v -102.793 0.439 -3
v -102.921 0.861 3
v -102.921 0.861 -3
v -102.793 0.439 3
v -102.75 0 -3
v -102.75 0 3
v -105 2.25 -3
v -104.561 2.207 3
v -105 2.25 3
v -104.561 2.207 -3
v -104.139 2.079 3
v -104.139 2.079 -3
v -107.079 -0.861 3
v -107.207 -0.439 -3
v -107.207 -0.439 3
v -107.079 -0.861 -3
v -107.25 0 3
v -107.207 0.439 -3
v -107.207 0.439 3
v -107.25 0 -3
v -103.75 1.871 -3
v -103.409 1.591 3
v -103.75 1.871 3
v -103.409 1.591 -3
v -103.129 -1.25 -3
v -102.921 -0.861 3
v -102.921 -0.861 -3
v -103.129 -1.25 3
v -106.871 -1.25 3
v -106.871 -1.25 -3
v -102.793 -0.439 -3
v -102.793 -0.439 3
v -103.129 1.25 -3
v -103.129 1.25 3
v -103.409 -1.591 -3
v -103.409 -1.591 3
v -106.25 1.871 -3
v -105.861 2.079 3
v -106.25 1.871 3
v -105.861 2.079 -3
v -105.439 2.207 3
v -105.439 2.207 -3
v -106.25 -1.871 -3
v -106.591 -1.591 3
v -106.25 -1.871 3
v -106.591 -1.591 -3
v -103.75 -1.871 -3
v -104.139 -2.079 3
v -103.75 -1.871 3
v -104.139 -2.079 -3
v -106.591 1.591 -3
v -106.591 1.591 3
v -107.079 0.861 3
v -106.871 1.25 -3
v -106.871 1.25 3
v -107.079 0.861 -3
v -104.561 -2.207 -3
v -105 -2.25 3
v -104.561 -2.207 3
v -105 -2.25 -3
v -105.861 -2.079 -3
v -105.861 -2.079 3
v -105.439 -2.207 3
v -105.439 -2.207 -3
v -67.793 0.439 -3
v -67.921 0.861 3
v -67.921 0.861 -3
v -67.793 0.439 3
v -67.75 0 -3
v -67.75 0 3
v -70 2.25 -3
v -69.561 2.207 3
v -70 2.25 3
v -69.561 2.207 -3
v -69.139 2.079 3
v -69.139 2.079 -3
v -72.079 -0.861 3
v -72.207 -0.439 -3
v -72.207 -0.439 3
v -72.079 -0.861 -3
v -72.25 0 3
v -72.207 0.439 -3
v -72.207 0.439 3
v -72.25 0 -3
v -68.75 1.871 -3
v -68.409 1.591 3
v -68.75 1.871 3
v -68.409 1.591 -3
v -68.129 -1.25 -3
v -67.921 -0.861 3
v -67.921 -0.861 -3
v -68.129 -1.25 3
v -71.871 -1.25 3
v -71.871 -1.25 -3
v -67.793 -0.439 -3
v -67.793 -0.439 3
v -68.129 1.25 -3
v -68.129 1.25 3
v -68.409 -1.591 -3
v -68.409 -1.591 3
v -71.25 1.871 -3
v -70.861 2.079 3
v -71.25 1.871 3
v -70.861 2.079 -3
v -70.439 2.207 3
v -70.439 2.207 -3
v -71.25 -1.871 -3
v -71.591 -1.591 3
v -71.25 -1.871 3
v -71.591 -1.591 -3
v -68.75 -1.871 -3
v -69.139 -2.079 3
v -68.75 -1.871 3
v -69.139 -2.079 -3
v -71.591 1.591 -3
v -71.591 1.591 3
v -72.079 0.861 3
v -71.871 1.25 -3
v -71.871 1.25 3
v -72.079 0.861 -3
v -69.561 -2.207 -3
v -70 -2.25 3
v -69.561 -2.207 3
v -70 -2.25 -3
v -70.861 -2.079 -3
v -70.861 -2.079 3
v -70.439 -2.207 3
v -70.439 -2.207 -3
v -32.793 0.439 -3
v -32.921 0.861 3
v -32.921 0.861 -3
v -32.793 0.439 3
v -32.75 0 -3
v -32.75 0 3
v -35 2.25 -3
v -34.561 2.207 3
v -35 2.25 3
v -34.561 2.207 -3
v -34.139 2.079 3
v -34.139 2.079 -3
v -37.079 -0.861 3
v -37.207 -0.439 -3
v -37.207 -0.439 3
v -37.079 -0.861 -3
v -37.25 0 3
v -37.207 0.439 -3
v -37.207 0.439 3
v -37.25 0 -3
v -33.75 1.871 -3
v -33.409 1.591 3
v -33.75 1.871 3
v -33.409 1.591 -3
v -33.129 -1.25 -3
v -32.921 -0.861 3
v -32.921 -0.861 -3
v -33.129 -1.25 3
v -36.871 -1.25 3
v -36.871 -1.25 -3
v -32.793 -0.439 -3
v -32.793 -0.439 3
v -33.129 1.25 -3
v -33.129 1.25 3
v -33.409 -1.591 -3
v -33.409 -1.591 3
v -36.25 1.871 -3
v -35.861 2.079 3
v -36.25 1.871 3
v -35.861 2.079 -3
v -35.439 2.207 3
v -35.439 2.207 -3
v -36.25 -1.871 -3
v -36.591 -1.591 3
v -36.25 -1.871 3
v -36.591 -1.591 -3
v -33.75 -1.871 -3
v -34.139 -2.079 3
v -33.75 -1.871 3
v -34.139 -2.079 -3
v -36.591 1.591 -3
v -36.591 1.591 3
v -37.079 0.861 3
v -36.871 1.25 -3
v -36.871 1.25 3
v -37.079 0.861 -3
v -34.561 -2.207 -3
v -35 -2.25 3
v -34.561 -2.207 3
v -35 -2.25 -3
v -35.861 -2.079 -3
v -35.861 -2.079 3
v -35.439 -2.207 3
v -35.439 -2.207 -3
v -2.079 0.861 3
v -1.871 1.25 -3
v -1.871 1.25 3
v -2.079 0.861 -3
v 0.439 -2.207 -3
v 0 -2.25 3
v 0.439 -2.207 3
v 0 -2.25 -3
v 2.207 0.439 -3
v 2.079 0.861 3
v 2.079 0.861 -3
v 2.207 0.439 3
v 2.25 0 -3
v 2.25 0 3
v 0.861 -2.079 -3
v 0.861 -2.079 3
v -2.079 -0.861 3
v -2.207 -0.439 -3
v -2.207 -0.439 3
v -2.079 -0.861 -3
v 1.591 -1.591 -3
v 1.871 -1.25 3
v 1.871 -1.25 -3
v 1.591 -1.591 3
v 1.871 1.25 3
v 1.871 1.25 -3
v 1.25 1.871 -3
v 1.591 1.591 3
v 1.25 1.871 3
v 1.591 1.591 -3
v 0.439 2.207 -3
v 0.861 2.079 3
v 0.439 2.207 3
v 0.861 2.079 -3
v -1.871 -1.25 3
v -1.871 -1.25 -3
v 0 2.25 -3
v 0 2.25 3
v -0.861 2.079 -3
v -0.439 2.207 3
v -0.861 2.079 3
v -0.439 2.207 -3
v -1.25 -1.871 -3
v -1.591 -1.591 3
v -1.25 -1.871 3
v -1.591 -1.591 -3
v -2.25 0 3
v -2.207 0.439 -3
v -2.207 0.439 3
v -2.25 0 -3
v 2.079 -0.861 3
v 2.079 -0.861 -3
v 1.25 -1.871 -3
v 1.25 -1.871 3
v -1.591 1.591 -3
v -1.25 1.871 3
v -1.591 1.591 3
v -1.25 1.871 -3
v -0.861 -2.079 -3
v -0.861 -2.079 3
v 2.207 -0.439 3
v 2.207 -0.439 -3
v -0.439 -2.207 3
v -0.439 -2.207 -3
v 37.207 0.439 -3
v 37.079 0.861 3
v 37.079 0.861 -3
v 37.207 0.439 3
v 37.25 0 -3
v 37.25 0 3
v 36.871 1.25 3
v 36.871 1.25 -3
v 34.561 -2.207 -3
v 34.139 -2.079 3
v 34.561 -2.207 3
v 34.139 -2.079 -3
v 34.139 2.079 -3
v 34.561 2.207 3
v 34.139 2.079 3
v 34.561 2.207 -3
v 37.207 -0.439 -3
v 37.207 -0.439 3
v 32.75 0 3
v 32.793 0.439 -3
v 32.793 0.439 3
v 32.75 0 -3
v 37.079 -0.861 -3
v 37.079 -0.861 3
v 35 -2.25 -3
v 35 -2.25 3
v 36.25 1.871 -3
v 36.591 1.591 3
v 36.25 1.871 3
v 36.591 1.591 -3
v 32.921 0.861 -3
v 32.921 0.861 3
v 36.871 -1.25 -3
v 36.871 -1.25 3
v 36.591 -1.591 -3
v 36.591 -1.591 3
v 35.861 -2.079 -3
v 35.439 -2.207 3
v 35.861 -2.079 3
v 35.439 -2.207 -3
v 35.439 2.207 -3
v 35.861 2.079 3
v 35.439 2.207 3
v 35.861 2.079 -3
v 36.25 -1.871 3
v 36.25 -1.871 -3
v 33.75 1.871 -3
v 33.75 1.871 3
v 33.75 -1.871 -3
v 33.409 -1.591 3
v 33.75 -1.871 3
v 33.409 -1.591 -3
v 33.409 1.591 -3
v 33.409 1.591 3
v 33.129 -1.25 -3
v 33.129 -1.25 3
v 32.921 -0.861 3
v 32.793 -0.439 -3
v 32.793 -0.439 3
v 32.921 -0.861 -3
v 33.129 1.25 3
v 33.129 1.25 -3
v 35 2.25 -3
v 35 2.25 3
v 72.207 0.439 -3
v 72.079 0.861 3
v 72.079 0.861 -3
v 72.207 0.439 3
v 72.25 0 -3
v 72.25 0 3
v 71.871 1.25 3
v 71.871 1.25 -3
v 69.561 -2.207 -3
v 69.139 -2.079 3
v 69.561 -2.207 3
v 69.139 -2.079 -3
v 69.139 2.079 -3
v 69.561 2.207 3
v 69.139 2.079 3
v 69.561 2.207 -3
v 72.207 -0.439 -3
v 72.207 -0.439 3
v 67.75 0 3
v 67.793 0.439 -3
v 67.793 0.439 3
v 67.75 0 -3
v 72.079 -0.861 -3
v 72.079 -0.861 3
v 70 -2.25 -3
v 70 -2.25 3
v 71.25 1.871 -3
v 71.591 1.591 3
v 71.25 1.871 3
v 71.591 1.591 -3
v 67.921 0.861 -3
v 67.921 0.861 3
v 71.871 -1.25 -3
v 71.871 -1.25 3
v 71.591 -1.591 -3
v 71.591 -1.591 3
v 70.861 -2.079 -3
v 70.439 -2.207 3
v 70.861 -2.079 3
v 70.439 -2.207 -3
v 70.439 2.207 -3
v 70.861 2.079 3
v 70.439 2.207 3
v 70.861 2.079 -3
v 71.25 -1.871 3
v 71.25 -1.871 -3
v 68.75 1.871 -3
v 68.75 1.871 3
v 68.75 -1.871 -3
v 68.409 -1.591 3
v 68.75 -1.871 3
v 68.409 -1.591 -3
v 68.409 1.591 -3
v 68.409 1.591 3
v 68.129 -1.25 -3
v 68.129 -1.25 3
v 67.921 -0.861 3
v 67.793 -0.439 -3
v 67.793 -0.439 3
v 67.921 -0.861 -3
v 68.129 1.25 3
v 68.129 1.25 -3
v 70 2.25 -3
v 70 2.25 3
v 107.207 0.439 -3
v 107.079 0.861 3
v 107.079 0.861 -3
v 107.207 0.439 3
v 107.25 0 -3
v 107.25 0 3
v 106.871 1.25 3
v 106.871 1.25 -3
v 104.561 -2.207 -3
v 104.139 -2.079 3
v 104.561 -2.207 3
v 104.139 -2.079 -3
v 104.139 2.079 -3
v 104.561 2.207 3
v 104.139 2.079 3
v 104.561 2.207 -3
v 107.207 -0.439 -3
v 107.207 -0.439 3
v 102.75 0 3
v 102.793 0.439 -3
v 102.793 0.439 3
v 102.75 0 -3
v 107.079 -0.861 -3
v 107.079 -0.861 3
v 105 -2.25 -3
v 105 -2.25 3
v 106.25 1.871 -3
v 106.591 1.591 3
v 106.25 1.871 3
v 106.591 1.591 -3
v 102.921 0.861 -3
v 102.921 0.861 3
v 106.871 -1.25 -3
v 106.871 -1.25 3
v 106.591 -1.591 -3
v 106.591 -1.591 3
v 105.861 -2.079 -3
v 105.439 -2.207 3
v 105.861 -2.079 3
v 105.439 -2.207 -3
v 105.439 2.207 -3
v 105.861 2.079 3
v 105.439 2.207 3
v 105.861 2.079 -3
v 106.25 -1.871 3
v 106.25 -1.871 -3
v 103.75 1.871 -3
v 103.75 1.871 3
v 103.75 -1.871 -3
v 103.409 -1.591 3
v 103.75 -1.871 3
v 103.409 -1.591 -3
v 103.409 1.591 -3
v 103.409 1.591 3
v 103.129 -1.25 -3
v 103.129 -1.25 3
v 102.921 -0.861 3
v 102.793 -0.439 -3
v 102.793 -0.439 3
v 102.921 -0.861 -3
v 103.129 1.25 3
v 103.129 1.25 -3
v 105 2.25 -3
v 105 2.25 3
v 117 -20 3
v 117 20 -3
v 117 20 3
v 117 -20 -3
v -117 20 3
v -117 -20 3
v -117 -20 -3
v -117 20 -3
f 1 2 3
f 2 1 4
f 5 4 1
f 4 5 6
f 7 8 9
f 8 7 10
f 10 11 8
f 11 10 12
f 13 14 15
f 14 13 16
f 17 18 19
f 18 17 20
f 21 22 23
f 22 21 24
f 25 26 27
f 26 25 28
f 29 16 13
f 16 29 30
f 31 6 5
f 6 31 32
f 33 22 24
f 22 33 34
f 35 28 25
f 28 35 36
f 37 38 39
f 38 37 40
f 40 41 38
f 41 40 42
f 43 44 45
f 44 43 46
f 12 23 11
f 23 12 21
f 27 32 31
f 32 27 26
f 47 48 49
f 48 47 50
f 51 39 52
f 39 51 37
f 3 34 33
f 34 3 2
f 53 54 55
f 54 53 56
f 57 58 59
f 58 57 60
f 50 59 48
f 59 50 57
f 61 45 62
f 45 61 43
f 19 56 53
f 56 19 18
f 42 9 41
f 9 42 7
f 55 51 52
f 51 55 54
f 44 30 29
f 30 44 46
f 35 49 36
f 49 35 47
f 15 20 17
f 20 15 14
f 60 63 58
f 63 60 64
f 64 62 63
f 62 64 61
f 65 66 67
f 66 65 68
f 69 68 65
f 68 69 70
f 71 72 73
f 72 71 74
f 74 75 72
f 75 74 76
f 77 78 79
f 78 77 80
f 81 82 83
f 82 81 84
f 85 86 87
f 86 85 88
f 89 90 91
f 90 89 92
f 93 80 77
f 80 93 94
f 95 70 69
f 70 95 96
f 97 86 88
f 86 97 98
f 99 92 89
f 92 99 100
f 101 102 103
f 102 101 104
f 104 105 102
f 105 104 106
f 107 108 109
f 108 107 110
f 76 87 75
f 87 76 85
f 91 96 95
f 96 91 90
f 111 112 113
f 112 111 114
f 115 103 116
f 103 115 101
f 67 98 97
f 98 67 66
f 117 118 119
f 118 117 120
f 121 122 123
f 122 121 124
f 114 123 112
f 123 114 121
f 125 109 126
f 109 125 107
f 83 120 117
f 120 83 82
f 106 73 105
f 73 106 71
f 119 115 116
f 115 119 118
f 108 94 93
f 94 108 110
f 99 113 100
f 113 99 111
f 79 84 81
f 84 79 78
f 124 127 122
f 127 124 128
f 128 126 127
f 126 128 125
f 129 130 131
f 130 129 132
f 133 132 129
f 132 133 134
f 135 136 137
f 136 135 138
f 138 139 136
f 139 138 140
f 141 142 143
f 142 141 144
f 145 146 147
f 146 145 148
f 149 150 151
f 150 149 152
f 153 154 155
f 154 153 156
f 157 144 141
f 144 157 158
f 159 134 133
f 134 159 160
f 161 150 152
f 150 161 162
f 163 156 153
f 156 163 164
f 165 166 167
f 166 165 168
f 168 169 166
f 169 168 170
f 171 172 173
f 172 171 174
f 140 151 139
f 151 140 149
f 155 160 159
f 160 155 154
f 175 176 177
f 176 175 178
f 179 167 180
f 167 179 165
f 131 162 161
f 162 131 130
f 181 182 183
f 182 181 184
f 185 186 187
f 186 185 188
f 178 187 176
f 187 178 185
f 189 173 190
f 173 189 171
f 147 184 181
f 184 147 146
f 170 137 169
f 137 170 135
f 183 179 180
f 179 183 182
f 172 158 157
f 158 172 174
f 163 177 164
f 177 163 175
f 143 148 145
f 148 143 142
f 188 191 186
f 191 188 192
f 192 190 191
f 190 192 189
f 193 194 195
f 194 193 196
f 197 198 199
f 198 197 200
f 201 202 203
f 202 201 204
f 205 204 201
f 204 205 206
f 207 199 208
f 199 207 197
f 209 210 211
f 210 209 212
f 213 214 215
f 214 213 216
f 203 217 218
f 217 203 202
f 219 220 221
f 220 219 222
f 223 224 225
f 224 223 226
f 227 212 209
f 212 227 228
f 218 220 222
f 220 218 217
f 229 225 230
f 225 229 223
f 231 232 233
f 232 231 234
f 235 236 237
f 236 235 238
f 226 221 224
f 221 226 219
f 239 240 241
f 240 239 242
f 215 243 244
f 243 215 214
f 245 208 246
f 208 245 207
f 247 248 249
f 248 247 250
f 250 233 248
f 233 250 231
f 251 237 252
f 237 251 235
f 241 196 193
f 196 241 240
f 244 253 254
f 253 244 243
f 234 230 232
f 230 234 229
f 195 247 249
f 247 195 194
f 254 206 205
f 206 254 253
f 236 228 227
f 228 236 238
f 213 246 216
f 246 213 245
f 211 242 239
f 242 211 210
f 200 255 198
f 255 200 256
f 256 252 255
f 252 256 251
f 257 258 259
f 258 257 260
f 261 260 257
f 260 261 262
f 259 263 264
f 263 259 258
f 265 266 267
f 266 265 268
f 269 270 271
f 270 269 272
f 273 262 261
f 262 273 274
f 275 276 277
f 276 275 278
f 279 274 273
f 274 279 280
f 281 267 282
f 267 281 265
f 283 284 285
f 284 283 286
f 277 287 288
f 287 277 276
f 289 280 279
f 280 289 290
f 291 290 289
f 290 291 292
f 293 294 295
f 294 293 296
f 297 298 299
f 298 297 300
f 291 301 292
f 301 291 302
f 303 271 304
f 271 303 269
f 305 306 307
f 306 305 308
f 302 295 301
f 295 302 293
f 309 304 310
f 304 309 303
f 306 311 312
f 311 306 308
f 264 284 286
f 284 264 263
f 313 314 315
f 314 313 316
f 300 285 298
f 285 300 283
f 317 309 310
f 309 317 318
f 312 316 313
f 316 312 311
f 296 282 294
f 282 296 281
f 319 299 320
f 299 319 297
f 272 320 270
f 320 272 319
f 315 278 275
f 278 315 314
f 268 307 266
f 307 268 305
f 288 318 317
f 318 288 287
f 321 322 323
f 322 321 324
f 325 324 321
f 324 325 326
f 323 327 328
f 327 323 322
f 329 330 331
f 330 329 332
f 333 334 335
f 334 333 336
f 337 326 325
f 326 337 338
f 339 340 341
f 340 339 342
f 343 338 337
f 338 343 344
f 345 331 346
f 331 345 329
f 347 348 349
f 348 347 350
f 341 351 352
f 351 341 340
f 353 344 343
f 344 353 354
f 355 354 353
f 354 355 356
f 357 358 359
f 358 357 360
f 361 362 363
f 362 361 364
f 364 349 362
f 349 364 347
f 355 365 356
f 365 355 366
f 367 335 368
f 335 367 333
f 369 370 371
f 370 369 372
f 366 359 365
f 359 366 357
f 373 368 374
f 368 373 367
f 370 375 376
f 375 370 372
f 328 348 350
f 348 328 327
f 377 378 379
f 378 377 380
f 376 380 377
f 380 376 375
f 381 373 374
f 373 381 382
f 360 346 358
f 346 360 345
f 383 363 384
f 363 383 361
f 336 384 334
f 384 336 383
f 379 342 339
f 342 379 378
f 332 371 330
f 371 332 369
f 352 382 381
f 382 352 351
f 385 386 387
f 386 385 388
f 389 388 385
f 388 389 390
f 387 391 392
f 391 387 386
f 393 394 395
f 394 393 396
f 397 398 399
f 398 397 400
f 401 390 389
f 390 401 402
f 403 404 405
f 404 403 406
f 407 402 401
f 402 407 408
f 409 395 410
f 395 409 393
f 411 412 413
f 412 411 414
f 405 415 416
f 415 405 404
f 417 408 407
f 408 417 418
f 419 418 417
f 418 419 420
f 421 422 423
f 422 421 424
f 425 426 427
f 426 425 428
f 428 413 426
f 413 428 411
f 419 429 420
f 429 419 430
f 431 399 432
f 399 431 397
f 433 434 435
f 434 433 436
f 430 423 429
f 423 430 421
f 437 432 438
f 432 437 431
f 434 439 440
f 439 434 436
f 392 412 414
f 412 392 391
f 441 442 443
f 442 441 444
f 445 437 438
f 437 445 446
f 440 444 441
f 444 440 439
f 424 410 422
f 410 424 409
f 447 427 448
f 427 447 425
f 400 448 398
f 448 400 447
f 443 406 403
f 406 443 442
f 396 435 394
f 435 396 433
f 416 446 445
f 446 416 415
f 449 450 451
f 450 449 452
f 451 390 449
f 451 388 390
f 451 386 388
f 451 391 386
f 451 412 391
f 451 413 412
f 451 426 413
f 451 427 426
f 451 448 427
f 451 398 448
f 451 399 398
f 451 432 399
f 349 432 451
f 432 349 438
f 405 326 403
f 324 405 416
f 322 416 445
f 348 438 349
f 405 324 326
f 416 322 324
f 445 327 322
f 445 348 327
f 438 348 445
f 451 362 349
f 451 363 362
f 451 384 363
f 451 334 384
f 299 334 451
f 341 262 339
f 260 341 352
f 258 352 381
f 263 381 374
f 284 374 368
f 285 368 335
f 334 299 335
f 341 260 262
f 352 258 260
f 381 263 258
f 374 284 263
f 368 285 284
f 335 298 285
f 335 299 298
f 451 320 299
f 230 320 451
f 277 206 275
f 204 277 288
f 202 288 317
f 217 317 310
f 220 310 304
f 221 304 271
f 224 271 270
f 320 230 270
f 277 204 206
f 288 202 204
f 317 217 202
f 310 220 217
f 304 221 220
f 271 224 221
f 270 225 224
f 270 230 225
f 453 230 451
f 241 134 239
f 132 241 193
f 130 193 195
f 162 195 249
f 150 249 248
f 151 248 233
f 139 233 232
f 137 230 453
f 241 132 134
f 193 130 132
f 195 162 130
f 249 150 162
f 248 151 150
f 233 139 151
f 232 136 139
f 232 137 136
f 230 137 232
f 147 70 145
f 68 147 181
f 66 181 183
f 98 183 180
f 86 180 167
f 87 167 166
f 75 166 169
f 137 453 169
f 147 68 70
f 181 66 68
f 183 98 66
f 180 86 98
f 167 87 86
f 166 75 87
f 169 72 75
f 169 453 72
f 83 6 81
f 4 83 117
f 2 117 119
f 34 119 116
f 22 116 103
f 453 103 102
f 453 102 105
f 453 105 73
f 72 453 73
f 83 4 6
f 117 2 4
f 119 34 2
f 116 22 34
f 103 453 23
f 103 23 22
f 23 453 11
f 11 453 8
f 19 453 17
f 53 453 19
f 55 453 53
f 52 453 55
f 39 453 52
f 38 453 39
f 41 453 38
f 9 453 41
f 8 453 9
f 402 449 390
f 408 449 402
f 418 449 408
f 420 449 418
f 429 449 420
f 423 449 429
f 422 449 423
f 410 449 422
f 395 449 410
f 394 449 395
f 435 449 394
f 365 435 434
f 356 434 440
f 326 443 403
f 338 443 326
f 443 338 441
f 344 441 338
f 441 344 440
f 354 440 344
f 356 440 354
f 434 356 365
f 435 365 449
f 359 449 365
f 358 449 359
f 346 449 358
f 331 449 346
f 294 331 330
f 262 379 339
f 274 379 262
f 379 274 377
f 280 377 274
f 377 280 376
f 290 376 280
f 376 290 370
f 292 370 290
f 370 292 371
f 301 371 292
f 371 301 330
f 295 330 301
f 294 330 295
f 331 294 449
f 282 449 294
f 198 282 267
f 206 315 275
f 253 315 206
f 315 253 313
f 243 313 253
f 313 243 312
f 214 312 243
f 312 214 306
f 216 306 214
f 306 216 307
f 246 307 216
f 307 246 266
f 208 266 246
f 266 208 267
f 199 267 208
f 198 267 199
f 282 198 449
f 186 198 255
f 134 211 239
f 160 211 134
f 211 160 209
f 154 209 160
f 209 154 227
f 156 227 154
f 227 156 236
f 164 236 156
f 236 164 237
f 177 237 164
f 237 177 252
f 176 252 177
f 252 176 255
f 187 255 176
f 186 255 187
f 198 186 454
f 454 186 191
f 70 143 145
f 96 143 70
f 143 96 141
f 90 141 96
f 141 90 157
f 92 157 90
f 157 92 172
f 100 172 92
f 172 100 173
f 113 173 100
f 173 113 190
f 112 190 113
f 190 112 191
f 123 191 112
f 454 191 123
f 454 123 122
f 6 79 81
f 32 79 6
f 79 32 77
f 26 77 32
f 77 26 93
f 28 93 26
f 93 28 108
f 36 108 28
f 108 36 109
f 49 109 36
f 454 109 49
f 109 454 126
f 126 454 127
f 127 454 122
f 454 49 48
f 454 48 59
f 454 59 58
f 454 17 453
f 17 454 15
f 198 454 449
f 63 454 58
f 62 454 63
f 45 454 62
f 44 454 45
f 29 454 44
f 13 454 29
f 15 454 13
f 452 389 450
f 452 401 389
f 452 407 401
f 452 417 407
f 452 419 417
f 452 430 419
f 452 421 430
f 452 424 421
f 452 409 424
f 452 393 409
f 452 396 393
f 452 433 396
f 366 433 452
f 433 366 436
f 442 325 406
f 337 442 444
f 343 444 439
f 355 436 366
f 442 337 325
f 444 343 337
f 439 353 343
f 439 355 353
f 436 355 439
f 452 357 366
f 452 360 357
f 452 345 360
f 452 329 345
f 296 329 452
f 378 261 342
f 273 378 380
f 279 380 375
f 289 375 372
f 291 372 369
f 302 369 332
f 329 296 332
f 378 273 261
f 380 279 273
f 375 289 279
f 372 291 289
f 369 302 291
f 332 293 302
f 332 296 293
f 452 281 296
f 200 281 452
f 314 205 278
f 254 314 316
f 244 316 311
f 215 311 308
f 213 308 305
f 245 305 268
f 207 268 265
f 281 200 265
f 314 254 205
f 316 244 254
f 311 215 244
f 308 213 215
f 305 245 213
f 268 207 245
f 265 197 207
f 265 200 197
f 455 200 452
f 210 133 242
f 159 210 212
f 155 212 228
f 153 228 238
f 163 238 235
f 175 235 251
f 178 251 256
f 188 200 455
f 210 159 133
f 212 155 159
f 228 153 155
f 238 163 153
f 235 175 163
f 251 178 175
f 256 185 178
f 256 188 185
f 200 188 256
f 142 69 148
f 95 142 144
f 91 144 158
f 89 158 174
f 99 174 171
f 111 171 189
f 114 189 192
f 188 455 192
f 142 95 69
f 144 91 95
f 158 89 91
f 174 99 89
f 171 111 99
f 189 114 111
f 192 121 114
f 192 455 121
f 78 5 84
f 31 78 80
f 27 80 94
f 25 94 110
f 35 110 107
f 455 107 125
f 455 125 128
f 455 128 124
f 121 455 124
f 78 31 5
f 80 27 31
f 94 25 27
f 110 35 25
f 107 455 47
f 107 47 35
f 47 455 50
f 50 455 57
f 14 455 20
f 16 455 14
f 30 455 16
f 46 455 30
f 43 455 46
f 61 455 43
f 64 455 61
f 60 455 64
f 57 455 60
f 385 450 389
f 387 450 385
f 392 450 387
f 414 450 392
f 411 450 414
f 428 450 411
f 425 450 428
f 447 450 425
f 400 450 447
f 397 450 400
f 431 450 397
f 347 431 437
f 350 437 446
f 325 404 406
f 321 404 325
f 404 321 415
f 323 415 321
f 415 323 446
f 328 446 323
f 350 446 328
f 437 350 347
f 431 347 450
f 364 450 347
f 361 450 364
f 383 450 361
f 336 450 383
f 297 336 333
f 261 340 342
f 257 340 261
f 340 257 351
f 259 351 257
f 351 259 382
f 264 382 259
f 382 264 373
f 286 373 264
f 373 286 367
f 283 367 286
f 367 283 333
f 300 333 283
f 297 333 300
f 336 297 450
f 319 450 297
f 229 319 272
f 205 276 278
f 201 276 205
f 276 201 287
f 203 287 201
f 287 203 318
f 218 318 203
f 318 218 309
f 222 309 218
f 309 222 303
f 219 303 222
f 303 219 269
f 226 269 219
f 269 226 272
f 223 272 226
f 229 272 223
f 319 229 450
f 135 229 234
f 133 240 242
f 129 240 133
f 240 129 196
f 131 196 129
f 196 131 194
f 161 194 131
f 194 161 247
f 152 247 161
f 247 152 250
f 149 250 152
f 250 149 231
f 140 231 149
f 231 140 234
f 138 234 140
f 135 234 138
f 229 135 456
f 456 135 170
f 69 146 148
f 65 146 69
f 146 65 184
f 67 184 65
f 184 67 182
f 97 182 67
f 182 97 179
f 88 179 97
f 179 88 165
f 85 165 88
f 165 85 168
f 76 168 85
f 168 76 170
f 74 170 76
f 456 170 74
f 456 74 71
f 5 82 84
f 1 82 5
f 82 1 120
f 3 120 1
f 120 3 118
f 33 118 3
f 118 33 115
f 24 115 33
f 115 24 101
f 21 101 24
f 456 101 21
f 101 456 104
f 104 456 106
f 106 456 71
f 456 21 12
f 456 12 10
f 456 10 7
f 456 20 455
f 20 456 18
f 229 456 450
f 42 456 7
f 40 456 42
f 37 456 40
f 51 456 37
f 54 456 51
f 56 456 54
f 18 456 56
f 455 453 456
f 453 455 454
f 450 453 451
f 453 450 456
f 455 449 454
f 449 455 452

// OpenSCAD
$fn = 32;

// ----------------------------------------------------------------------
// Hole bar, 7 x Ø4.5
// skip layout, 12 mm edge offset
// ----------------------------------------------------------------------

// --- parameters (mm) ---
bar_w = 40;         // bar width (Y)
bar_t = 6;          // bar thickness (Z)
holes = 7;          // holes per row
hole_d = 4.5;       // hole diameter
edge = 12;          // offset from the bar end to the first hole
grid_pitch = 17.5;  // grid the bar was laid out on

// --- derived feature positions (mm) ---
pitch = grid_pitch * 2;       // = 35   holes sit every other grid slot
span = (holes - 1) * pitch;   // = 210   distance between the end holes
bar_l = span + 2 * edge;      // = 234   overall bar length
start_x = -bar_l / 2 + edge;  // = -105   X of the first hole
feature_centers = [
  [start_x + 0 * pitch, 0],
  [start_x + 1 * pitch, 0],
  [start_x + 2 * pitch, 0],
  [start_x + 3 * pitch, 0],
  [start_x + 4 * pitch, 0],
  [start_x + 5 * pitch, 0],
  [start_x + 6 * pitch, 0]
];   // hole centres of the first row

// bar with one row of holes, drilled from feature_centers
difference() {
  translate([-bar_l / 2, -bar_w / 2, -bar_t / 2]) cube([bar_l, bar_w, bar_t]);
  for (centre = feature_centers)
    translate([centre[0], centre[1], 0])
      cylinder(d = hole_d, h = bar_t + 2, center = true);
}
